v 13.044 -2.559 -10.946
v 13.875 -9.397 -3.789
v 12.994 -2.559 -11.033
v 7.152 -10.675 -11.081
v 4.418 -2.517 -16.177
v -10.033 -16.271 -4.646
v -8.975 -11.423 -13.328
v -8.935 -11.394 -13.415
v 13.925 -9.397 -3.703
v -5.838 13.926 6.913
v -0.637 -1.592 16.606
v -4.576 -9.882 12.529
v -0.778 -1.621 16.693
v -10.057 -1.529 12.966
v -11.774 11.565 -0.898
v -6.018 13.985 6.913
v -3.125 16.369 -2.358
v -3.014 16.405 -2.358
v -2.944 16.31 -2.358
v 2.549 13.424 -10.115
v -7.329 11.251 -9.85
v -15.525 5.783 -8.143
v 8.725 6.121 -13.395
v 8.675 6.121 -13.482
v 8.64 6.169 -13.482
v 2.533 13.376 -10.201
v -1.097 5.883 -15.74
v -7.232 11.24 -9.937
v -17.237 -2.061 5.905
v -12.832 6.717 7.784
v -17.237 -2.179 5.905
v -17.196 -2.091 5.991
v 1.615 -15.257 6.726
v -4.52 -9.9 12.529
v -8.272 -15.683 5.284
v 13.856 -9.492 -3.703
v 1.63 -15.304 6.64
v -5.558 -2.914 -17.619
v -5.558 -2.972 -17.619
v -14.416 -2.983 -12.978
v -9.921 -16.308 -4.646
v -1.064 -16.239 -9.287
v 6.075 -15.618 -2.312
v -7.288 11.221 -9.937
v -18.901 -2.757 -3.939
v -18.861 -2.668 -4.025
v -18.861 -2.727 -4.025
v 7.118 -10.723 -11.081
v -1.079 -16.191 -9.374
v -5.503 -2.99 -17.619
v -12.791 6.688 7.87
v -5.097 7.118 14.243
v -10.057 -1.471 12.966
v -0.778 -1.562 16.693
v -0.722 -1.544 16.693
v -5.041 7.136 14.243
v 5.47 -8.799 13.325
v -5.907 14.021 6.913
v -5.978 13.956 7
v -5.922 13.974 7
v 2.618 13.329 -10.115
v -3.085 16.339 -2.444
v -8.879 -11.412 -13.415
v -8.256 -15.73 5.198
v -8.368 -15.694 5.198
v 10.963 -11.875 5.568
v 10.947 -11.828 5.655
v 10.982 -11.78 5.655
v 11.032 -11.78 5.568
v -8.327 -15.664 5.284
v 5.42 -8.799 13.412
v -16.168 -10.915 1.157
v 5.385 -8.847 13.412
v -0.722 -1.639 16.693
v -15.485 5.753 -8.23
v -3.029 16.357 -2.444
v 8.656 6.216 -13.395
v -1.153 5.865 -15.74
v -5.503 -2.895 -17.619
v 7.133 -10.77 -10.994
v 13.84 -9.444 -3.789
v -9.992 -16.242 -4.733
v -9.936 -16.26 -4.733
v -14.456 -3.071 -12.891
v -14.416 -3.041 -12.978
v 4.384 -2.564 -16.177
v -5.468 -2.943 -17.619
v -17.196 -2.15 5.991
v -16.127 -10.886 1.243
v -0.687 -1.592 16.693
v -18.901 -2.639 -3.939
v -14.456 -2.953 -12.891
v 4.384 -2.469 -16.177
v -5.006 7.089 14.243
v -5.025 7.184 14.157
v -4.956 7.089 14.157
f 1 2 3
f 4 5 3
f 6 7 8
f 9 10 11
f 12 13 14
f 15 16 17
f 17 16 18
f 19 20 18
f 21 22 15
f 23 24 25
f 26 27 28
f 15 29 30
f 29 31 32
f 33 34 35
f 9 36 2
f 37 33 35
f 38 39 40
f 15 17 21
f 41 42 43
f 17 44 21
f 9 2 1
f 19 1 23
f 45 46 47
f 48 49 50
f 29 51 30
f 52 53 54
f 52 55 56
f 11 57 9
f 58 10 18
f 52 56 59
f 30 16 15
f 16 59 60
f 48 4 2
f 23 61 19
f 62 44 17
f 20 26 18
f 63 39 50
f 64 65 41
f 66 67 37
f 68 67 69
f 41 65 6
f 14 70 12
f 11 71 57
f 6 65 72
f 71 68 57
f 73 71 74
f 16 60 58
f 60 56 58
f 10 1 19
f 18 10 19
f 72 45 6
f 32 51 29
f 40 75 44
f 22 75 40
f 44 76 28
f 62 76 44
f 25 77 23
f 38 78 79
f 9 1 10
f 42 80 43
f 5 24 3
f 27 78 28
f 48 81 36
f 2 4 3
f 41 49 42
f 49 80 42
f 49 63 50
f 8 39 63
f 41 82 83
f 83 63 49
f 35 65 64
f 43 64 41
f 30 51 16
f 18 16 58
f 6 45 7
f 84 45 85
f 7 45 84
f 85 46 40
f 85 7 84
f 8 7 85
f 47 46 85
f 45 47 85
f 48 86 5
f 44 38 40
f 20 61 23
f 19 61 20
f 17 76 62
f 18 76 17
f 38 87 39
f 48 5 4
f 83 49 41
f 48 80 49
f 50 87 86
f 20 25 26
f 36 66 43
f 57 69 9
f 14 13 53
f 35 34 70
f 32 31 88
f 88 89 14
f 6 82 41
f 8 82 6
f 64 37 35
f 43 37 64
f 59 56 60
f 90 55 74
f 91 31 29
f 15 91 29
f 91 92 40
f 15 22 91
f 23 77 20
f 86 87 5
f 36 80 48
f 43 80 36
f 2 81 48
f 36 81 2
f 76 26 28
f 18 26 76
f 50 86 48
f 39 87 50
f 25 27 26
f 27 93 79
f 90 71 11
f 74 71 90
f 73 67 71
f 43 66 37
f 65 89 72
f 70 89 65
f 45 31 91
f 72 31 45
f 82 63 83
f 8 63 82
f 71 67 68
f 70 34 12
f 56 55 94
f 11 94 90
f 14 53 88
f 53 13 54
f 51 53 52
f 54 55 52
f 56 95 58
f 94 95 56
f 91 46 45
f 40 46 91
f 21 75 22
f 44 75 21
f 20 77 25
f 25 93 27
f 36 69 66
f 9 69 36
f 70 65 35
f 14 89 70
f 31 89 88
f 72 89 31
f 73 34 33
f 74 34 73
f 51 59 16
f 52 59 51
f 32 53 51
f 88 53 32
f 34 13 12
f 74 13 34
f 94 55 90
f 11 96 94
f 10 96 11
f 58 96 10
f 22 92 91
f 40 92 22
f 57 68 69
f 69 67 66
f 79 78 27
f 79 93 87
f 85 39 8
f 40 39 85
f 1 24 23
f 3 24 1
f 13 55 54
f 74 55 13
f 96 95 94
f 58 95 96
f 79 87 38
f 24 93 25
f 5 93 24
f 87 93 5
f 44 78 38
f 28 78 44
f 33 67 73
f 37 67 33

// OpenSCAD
// Auto-generated OpenSCAD file

    inner_points = 10*[[-0.45355703407615483, -0.9852604747027949, 1.2442629448836795], [-0.11128666904117222, 0.5835651383085163, -1.565322994036517], [-1.0016741042155215, -0.15000111337832142, 1.287960504788888], [0.1599278591139769, -1.520900805152802, 0.6639822178016064], [-0.7247715622313039, 1.119205468758524, -0.9850422669544439], [0.43683040109819454, -0.25169422301595684, -1.6090205539417255], [-1.2750612603248952, 0.6658365922161982, 0.7783839148588771], [0.604450197740842, -1.5523257042416663, -0.23123416172848094], [-1.1692939008581689, 1.150630367847388, -0.08982588742435665], [0.7102175572075684, -1.0675319286104765, -1.0994439640117146], [-0.07373926097703089, -0.15917918368749281, 1.6605899316050716], [0.5369510310439554, -0.879903803247868, 1.3325451328490563], [0.25177920002421017, 1.3328626384976536, -1.0114850836962188], [0.8624694920451964, 0.6121380189372783, -1.3395298824522341], [-0.5056295914533497, 0.708853913520469, 1.415662831037149], [1.0931783496571914, -1.1780276370174307, 0.5568303980612812], [-0.3044481185890256, 1.6309864722672165, -0.23577034890844362], [1.2943598225215154, -0.2558950782706834, -1.0946027818843114], [-0.5937525335554718, 1.3926363486024174, 0.691317658796271], [1.3824827646236373, -0.9396775133526316, -0.3702576096434335], [-0.8286998825229884, -1.5635001676990283, 0.5197584930665651], [-0.5517973405387707, -0.2942935855621831, -1.7532442786767668], [-1.715571931822494, -0.2120221316545012, 0.5904626302186273], [-1.5444367493050026, 0.5723906748511545, -0.8143303392414709], [-0.10944762986613042, -1.614346722517846, -0.9287320362987417], [-1.608667983638949, -1.0856125902905323, 0.11568767674818647], [-1.4375328011214579, -0.30119978378487644, -1.2891052927119118], [-0.9951830904488174, -1.6212529207405393, -0.4645930503338865], [-0.889415730982091, -1.1364591451093493, -1.3328028526171203], [-1.8820551397483227, -0.2697748846960123, -0.39388891318182445]];

    outer_points = 10*[[-1.2023976649193235, -0.20790108708079238, 1.1467271385135702], [0.5703055554767221, -0.20790108708079238, -1.5606072049684219], [-1.4167473948229383, 0.6253103044559617, 0.6370086178537524], [-0.649491745903262, -1.0411124786175465, 1.139390809023269], [0.01739963646066056, 0.6253103044559617, -1.5532708754781206], [0.7846552853803369, -1.0411124786175465, -1.050888684308604], [-1.210666624270285, 1.1402632642392723, -0.19506960275945007], [0.0307790937421078, -1.5560654384008572, 0.6178018578954751], [-0.662871203184709, 1.1402632642392723, -1.0316819243503268], [0.5785745148276837, -1.5560654384008572, -0.21881046369540158], [-0.7286095026793453, 0.645946238583741, 1.3622950437703323], [-0.32523933709311637, -0.2301440644221562, 1.6264129918427295], [0.9573314465357177, 0.645946238583741, -1.2125329253878778], [1.3607016121219466, -0.2301440644221562, -0.9484149773154806], [-0.7329567518749942, 1.354718182322609, 0.6568707507430379], [0.32308005167742637, -0.9389160081610243, 1.3483405158354533], [0.30901205776517493, 1.354718182322609, -0.9344604493806018], [1.3650488613175955, -0.9389160081610243, -0.24299068428818626], [-0.336620583244891, 1.6254449745585284, -0.22041178379259257], [0.9687126926874923, -1.2096428003969435, 0.6342918502474442], [-1.4850387512679277, -0.9906633299119916, 0.5922929336654642], [-0.05089171998432884, -0.9906633299119916, -1.597986559666409], [-1.8318638997313361, 0.35750102140807305, -0.23244895745743688], [-0.9455122895333135, 0.35750102140807305, -1.586116129198433], [-0.3843374111662901, -1.8238747214487456, -0.2516557174157139], [-1.874070279152174, -0.6412256095550173, -0.26008477011600517], [-0.9877186689541513, -0.6412256095550173, -1.6137519418570012], [-1.3211643601361125, -1.4744370010917713, -0.26742109960630656], [-0.7733689390505365, -1.4744370010917713, -1.1040334211971832], [-1.6679895085995209, -0.12627264977170682, -1.0921629907292074]];

    // Convex hull for inner set (I)
    module inner_hull() {
        hull() {
            for (p = inner_points) {
                translate(p) sphere(r=0.1);
            }
        }
    }

    // Convex hull for outer set (O) minus inner hull (O \ I)
    module outer_minus_inner() {
        difference() {
            hull() {
                for (p = outer_points) {
                    translate(p) sphere(r=0.1);
                }
            }
            inner_hull(); // Subtract inner hull
        }
    }

    // Convex hull for outer set (O) minus all translated inner hulls
    module outer_minus_AllTranslationInner() {
        difference() {
            hull() {
                for (p = outer_points) {
                    translate(p) sphere(r=0.1);
                }
            }
            hull() {
                translate([0,0,50]) inner_hull();
                translate([0,0,-50]) inner_hull();
            }; // Subtract translated inner hulls
        }
    }

    // Difference between outer_minus_inner and outer_minus_AllTranslationInner
    module outer_minus_inner_diff() {
        difference() {
            // Outer minus inner
            difference() {
                hull() {
                    for (p = outer_points) {
                        translate(p) sphere(r=0.1);
                    }
                }
                inner_hull();
            }

            // Subtract Outer minus AllTranslationInner
            difference() {
                hull() {
                    for (p = outer_points) {
                        translate(p) sphere(r=0.1);
                    }
                }
                hull() {
                    translate([0,0,50]) inner_hull();
                    translate([0,0,-50]) inner_hull();
                };
            }
        }
    }

    // Rendering all with colors applied
    color([1, 0, 0, 0.5]) inner_hull(); // Transparent red
    
